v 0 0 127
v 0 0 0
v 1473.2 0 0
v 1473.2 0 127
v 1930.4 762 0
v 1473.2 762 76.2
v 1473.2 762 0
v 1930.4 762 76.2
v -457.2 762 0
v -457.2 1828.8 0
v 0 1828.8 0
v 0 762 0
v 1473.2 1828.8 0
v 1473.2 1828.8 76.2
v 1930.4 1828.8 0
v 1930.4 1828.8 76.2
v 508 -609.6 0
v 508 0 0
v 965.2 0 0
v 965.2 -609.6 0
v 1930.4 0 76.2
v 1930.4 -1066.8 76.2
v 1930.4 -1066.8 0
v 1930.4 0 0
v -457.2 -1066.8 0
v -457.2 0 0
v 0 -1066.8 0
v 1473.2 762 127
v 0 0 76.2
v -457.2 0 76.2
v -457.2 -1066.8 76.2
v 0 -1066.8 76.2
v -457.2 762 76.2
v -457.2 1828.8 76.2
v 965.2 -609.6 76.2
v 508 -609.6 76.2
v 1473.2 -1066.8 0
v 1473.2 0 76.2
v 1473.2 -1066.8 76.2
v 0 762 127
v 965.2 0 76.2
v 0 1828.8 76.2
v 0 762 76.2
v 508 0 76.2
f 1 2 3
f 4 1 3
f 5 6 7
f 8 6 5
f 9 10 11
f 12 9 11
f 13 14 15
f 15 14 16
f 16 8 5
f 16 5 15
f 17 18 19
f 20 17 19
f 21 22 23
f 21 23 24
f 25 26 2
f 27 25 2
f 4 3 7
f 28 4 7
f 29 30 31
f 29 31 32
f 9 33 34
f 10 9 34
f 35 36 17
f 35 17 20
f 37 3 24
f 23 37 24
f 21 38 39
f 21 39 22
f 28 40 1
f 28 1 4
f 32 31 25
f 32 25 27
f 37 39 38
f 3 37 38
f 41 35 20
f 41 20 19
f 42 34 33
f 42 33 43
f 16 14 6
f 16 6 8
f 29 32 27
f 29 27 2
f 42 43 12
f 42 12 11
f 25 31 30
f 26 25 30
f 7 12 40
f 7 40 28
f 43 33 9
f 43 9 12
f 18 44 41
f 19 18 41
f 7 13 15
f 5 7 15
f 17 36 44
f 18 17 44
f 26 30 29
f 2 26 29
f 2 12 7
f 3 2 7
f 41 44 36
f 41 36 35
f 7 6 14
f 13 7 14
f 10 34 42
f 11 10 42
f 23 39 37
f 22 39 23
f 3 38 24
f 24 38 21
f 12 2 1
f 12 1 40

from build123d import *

# Parameters (mm, degrees)
F0_W     = 1473.2
F0_H     = 762
F1_DEPTH = 127
F3_START = -50.8
F2_W     = 457.2
F2_H     = 1066.8
F3_DEPTH = 76.2
F5_START = -50.8
F4_W     = 457.2
F4_H     = 609.6
F5_DEPTH = 76.2


with BuildPart() as f1:
    # F0 (on Top) → F1 (new body)
    with BuildSketch(Plane.XY):
        with Locations((736.6, 381)):
            Rectangle(F0_W, F0_H)
    extrude(amount=F1_DEPTH)


with BuildPart() as f3:
    # F2 (on face) → F3 (new body)
    with BuildSketch(Plane.XY.offset(127).offset(F3_START)):
        with Locations((1701.8, 1295.4)):
            Rectangle(F2_W, F2_H)
    extrude(amount=-F3_DEPTH)


with BuildPart() as f3b:
    # F2 (on face) → F3, piece 2 (new body)
    with BuildSketch(Plane.XY.offset(127).offset(F3_START)):
        with Locations((-228.6, 1295.4)):
            Rectangle(F2_W, F2_H)
    extrude(amount=-F3_DEPTH)


with BuildPart() as f3c:
    # F2 (on face) → F3, piece 3 (new body)
    with BuildSketch(Plane.XY.offset(127).offset(F3_START)):
        with Locations((-228.6, -533.4)):
            Rectangle(F2_W, F2_H)
    extrude(amount=-F3_DEPTH)


with BuildPart() as f3d:
    # F2 (on face) → F3, piece 4 (new body)
    with BuildSketch(Plane.XY.offset(127).offset(F3_START)):
        with Locations((1701.8, -533.4)):
            Rectangle(F2_W, F2_H)
    extrude(amount=-F3_DEPTH)


with BuildPart() as f5:
    # F4 (on face) → F5 (new body)
    with BuildSketch(Plane.XY.offset(127).offset(F5_START)):
        with Locations((736.6, -304.8)):
            Rectangle(F4_W, F4_H)
    extrude(amount=-F5_DEPTH)


solid = Compound([f1.part, f3.part, f3b.part, f3c.part, f3d.part, f5.part])
